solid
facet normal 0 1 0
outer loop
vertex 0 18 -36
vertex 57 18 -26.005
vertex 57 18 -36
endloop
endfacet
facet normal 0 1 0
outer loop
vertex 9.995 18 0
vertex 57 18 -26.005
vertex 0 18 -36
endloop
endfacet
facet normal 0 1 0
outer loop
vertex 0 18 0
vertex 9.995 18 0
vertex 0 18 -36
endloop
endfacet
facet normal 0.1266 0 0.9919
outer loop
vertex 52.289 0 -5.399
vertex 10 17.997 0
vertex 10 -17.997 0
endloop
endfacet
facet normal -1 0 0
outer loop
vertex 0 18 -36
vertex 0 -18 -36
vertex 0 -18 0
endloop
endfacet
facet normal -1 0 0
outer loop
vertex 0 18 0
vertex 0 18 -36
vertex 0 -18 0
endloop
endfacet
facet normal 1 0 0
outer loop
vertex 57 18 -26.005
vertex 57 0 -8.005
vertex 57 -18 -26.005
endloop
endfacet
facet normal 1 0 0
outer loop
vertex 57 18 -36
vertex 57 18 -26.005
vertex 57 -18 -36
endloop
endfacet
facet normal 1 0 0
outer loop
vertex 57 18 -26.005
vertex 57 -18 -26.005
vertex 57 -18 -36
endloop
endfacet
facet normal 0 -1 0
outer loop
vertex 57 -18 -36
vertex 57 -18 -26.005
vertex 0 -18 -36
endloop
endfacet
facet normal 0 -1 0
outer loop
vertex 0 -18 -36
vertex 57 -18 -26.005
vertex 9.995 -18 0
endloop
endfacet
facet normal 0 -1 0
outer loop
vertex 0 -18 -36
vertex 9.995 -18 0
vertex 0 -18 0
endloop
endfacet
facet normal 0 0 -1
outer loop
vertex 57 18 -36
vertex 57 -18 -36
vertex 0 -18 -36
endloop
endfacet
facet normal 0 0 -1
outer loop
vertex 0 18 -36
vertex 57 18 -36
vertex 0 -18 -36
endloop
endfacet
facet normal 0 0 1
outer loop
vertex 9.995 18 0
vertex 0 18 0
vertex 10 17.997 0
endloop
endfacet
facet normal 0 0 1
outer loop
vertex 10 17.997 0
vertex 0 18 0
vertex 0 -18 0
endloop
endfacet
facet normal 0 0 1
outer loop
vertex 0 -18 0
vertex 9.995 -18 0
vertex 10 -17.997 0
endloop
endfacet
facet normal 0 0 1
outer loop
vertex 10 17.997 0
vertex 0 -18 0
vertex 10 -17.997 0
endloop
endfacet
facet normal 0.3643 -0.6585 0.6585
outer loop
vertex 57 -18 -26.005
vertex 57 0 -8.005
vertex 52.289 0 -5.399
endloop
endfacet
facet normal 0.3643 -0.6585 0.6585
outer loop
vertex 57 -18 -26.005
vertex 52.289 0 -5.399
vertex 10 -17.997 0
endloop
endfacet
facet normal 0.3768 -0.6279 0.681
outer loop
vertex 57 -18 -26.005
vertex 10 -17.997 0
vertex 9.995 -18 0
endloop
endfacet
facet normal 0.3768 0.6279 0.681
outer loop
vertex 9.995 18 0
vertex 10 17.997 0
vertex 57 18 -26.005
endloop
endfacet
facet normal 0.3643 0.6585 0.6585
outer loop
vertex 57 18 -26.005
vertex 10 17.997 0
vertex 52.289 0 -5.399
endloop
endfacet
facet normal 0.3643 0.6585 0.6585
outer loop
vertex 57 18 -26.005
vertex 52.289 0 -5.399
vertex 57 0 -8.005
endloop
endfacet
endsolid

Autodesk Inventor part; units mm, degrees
ref_plane "YZ Plane" through (0, 0, 0) normal (1, 0, 0) x (0, 1, 0)
ref_plane "XZ Plane" through (0, 0, 0) normal (0, 1, 0) x (-1, 0, 0)
sketch "草圖1" plane through (0, 0, 0) normal (0, 1, 0) x (-1, 0, 0)
  line L0 (0, 0) -> (-57, 0)
  line L1 (-57, 0) -> (-57, -36)
  line L2 (-57, -36) -> (0, -36)
  line L3 (0, -36) -> (0, 0)
  dimension "d0" = 57
  dimension "d1" = 36
extrude "擠出1" add sketch "草圖1" along normal mid plane 36
sketch "草圖2" plane through (0, 18, 0) normal (0, 1, 0) x (1, 0, 0)
  line L0 (0, 0) -> (57, 0) projected
  line L1 (10, 0) -> (57, 6)
  line L2 (57, 0) -> (57, 36) projected
  dimension "d4" = 10
  dimension "d5" = 30
extrude "擠出2" cut sketch "草圖2" against normal blind 40
sketch "草圖3" plane through (57, -18, -36) normal (1, 0, 0) x (0, 0, -1)
  line L0 (-30, 16) -> (-10, 36)
  line L1 (0, 36) -> (-36, 36) projected
  line L2 (-30, 36) -> (-30, 0) projected
  point P0 (-36, 18)
  dimension "d8" = 20
  dimension "d9" = 20
ref_plane "工作平面1" through (10, 18, 0) normal (-0.3643, -0.6585, -0.6585) x (0.875, 0, -0.4841)
sketch "草圖4" plane through (10, 18, 0) normal (-0.3643, -0.6585, -0.6585) x (0.875, 0, -0.4841)
  line L0 (-15.1543, -12.3218) -> (93.717, -12.3218)
  line L1 (93.717, -12.3218) -> (93.717, 28.8166)
  line L2 (93.717, 28.8166) -> (-15.1543, 28.8166)
  line L3 (-15.1543, 28.8166) -> (-15.1543, -12.3218)
  point P0 (-8.7503, 10.3585)
extrude "擠出3" cut sketch "草圖4" against normal blind 40
mirror "鏡射1" about plane through (0, 0, 0) normal (0, 1, 0) of "擠出3"
properties part number "2"
